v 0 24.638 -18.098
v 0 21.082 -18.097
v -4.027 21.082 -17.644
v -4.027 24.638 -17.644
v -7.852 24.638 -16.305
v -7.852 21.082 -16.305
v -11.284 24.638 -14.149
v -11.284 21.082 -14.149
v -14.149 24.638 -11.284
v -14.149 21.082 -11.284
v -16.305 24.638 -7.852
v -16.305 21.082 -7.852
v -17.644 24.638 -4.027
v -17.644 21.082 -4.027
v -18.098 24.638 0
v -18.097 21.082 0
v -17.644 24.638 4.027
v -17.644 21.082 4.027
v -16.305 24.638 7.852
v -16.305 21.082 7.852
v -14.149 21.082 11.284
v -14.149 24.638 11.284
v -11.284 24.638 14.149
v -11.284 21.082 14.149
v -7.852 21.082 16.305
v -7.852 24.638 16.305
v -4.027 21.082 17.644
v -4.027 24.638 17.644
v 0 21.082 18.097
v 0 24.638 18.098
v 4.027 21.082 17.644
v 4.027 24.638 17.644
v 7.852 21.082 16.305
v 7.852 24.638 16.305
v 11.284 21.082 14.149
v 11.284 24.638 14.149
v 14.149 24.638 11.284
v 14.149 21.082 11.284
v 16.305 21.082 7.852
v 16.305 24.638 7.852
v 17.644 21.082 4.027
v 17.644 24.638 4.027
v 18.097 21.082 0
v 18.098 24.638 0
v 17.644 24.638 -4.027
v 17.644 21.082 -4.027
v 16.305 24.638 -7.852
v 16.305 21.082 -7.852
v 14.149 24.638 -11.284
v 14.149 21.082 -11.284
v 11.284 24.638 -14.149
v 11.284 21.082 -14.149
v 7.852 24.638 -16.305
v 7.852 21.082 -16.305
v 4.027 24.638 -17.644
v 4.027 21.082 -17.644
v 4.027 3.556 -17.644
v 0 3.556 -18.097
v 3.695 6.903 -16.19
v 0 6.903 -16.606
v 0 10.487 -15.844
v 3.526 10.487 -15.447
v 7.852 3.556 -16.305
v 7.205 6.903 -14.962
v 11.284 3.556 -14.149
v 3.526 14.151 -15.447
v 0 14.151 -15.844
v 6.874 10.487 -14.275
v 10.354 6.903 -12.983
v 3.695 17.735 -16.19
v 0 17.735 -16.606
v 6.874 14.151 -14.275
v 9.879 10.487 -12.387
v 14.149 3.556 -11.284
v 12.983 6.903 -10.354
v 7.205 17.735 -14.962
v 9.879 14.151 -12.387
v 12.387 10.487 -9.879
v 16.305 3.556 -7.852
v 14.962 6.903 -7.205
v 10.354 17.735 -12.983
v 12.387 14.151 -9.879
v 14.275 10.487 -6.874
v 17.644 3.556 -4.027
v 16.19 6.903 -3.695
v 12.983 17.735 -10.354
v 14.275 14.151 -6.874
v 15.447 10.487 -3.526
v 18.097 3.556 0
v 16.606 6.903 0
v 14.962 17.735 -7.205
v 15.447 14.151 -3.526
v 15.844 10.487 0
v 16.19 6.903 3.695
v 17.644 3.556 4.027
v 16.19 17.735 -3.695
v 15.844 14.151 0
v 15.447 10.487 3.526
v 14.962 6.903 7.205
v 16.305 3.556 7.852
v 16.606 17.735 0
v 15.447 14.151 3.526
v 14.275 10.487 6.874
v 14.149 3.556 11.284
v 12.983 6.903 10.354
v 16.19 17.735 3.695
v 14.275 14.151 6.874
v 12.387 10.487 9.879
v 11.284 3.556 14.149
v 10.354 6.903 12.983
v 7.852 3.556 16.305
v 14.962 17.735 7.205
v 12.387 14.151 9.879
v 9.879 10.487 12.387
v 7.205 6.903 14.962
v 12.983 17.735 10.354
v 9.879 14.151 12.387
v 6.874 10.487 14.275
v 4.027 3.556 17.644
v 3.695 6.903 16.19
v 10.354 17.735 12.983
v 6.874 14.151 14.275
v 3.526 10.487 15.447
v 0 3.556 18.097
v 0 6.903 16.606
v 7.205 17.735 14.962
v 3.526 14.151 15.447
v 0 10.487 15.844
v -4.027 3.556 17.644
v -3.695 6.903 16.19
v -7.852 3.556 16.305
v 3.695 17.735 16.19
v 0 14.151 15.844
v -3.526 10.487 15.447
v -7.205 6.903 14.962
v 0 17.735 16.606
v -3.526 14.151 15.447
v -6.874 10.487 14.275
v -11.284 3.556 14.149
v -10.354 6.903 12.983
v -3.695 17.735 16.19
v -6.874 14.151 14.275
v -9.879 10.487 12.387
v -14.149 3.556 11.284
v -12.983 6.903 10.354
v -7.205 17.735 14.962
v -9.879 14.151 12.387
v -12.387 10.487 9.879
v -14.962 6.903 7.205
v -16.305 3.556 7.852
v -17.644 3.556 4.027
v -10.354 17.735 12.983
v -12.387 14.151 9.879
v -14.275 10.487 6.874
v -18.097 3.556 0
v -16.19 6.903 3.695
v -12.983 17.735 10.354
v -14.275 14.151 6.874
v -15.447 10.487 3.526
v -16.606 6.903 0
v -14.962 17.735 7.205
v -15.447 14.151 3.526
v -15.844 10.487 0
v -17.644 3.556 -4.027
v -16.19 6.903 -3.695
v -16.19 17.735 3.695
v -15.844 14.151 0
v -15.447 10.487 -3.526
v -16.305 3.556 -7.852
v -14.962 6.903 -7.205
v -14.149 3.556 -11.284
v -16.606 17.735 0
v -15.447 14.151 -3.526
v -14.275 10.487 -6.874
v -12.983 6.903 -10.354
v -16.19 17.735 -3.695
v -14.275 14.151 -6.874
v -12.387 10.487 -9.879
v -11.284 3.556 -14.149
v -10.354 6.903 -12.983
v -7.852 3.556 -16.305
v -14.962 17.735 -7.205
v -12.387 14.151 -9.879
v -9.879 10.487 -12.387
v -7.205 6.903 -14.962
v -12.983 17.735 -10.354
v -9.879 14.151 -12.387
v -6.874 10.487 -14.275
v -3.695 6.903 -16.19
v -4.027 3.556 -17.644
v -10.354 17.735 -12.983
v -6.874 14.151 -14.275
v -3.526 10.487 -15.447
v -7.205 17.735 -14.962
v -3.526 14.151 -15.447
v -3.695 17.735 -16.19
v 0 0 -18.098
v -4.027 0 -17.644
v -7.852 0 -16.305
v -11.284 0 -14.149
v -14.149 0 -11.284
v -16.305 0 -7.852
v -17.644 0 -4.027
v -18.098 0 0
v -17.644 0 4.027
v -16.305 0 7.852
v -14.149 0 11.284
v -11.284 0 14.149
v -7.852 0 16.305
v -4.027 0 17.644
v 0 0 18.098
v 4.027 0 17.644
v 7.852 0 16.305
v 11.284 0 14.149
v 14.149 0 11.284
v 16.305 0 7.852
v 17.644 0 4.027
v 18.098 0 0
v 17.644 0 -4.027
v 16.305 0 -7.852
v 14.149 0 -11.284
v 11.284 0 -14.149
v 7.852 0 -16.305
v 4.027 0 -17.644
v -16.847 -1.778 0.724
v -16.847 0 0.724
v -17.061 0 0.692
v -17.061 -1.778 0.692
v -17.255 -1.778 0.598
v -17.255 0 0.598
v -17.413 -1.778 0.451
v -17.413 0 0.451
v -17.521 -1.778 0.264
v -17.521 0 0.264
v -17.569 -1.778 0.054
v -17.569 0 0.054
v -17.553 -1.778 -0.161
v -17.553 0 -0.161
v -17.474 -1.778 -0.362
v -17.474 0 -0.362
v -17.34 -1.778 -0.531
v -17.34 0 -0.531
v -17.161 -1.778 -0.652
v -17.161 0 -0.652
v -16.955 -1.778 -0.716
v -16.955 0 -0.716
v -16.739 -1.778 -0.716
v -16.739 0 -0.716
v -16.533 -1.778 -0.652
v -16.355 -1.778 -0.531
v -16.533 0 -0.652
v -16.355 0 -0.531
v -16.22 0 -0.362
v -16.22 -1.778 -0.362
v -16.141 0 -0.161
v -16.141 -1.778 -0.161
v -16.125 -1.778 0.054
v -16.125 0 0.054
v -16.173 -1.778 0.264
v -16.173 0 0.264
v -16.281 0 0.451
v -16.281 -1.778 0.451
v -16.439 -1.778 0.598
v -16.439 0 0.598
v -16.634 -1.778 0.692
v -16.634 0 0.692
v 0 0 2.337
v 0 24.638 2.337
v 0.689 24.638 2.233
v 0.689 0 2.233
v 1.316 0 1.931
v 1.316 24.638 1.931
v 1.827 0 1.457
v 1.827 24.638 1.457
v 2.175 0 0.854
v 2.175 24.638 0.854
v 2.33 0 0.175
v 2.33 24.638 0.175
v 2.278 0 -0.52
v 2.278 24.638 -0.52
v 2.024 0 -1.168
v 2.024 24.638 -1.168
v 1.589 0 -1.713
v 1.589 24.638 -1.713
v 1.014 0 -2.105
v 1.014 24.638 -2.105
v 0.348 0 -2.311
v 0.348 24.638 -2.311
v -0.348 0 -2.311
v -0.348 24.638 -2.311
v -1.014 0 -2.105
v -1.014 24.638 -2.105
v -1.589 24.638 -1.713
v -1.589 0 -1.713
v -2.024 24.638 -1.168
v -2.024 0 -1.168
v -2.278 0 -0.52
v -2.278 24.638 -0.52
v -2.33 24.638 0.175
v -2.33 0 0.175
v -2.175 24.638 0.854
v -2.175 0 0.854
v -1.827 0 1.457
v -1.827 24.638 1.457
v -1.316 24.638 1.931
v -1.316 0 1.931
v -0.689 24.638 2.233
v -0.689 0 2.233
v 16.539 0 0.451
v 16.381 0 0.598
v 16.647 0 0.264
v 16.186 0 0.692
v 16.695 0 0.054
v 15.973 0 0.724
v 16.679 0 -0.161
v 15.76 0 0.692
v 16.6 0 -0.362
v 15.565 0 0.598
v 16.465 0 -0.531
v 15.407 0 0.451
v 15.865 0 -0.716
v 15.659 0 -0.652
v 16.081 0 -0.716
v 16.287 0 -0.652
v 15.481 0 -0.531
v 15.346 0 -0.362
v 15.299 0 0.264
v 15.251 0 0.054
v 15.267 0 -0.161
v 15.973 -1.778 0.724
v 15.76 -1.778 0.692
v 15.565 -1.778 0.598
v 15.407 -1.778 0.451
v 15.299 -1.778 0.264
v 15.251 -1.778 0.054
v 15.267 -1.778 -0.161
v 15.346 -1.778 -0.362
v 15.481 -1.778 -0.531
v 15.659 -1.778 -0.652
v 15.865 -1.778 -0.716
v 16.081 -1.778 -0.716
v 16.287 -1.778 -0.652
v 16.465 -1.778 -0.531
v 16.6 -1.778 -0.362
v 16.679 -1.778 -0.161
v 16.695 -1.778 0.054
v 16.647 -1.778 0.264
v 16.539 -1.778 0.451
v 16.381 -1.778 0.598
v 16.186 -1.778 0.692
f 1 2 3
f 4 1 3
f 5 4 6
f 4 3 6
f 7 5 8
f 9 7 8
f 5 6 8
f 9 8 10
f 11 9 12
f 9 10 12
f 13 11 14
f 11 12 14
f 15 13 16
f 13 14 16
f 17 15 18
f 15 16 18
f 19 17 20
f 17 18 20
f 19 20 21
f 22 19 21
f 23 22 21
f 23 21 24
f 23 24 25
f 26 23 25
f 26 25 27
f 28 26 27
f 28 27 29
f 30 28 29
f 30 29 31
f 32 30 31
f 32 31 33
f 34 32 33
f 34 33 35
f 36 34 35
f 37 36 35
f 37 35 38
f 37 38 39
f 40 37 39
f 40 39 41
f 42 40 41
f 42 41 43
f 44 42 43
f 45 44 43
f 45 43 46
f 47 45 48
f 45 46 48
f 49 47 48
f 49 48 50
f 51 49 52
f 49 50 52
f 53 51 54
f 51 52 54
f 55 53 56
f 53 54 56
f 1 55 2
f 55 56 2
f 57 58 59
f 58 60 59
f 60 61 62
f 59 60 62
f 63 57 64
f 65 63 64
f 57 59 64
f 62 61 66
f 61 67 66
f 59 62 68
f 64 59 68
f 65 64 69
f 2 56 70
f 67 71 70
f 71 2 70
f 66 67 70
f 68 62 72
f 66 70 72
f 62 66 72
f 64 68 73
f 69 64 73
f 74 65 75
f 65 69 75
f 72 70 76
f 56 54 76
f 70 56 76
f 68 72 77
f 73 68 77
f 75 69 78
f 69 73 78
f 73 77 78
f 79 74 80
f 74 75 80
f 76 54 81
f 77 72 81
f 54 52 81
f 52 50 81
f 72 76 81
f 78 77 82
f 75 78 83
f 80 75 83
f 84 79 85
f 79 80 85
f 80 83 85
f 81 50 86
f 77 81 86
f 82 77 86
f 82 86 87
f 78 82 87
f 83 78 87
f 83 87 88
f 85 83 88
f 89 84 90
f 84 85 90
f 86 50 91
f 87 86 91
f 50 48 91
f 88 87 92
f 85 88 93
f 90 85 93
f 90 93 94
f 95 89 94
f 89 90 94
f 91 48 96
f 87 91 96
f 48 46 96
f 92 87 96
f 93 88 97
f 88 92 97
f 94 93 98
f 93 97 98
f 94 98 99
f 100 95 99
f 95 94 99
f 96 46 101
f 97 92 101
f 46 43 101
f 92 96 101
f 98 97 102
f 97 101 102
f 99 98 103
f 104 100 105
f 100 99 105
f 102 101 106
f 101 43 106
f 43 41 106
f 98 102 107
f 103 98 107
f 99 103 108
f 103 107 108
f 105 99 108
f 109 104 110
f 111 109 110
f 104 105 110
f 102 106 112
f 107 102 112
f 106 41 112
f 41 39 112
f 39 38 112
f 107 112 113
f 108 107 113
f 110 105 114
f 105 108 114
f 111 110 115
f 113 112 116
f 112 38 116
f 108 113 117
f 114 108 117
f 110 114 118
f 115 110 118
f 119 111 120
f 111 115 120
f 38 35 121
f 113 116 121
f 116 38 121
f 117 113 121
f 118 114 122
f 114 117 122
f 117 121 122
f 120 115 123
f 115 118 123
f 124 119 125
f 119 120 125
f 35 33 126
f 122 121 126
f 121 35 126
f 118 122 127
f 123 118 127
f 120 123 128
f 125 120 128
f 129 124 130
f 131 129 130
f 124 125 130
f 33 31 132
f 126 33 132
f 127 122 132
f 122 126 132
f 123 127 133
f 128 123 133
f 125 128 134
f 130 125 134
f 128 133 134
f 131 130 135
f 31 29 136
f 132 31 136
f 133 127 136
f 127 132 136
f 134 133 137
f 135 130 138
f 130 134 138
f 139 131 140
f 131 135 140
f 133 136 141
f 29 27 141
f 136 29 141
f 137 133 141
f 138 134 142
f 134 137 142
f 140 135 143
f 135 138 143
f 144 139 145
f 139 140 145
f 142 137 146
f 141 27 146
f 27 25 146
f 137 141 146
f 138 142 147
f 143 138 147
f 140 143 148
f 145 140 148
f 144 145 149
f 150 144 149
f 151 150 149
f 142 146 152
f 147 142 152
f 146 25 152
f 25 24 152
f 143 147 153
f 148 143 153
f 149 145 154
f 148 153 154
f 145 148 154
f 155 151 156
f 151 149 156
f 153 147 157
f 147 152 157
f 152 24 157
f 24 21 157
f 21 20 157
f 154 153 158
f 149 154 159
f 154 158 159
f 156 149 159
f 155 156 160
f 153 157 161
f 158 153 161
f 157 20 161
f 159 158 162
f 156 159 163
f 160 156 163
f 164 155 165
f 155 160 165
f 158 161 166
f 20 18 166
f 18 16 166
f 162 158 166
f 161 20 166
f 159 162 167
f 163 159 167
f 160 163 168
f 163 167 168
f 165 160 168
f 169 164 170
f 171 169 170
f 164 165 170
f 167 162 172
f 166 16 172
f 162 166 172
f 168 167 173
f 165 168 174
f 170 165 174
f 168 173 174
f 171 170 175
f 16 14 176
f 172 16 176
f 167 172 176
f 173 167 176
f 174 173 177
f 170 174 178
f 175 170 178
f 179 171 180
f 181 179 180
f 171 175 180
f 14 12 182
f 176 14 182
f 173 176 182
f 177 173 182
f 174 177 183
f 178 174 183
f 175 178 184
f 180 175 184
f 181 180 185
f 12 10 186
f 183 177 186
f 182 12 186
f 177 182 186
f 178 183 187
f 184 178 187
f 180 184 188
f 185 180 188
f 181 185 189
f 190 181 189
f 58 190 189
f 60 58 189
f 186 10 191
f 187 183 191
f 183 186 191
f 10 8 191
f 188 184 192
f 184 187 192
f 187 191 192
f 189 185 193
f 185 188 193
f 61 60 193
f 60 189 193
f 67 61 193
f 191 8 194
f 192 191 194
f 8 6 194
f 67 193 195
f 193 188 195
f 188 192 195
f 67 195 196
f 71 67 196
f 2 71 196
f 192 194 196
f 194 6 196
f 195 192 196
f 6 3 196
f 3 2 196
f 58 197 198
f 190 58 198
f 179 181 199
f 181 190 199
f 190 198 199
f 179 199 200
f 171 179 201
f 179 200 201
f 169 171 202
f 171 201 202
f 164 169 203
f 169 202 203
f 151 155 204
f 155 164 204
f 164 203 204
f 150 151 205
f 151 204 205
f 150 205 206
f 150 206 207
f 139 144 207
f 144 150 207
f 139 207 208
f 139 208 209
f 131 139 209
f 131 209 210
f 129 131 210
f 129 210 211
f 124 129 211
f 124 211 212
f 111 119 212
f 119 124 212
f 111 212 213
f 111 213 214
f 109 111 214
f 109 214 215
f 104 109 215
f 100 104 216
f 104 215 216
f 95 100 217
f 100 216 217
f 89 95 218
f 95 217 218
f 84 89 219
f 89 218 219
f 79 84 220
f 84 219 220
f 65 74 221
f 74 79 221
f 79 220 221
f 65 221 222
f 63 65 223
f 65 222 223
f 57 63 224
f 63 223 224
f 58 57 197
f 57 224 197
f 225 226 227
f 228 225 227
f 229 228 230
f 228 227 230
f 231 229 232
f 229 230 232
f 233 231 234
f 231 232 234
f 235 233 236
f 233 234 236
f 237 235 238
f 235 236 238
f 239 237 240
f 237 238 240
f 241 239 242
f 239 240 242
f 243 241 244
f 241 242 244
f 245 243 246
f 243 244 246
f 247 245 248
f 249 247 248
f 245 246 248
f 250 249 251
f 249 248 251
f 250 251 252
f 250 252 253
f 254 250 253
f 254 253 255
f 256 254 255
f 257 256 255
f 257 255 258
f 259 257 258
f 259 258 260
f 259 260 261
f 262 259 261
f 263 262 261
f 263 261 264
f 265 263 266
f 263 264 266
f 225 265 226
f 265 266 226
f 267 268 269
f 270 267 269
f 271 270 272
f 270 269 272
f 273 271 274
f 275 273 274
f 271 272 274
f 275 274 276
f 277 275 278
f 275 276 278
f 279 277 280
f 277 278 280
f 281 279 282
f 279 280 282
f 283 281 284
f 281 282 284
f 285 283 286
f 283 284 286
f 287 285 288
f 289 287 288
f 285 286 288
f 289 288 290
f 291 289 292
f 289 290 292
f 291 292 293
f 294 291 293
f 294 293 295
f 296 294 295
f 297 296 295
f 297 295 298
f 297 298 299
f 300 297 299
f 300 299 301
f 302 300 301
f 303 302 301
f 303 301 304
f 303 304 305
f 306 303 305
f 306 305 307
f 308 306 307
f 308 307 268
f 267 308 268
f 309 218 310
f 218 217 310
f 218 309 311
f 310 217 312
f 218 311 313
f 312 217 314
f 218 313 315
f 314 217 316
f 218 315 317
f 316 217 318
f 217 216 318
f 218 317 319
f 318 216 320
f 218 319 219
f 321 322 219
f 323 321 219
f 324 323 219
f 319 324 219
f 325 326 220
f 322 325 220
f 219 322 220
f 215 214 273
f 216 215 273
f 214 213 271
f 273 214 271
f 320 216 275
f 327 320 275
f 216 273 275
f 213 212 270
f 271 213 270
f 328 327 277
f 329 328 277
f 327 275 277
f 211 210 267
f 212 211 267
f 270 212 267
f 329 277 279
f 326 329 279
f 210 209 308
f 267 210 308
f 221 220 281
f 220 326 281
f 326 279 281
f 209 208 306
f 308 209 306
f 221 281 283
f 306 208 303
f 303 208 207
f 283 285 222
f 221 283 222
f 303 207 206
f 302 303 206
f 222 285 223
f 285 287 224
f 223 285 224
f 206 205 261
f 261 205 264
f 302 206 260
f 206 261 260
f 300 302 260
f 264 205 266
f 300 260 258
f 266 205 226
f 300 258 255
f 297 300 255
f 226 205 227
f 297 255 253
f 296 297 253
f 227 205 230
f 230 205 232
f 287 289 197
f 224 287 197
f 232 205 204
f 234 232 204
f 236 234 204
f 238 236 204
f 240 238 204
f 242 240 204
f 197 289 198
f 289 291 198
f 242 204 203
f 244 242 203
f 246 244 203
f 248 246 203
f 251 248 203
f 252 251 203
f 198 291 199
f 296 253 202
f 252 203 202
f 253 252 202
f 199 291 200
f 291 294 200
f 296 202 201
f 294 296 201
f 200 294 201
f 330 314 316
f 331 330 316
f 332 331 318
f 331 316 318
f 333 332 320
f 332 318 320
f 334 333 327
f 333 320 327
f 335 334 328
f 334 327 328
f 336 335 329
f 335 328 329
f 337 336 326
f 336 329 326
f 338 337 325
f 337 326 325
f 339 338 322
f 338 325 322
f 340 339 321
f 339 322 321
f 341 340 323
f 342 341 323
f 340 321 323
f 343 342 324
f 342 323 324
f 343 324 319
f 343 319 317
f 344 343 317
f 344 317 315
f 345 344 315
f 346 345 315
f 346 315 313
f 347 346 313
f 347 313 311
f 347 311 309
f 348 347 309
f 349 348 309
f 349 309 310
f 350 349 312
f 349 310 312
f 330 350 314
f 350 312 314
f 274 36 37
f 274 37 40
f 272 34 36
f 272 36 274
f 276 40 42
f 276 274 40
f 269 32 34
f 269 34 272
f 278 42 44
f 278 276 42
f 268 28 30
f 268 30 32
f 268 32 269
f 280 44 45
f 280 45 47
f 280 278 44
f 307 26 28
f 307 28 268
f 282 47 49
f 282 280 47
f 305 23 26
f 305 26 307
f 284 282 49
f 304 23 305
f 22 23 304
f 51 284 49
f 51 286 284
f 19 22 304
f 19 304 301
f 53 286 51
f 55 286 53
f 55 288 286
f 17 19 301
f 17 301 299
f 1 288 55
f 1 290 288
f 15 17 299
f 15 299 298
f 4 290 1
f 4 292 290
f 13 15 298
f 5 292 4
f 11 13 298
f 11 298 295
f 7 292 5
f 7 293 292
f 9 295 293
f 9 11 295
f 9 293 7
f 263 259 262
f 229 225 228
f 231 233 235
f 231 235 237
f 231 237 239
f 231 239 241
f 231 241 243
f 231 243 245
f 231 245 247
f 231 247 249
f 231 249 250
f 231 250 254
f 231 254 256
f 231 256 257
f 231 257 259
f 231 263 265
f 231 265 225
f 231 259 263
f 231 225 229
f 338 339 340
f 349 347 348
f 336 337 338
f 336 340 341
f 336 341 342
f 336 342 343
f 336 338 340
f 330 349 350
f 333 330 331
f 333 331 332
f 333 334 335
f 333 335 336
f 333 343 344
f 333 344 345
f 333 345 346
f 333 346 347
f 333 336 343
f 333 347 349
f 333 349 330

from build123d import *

# Parameters (mm, degrees)
SKETCH2_R           = 18.0975
BOSS_EXTRUDE1_DEPTH = 24.638
SKETCH3_R           = 2.3368
CUT_EXTRUDE1_DEPTH  = 36.52562535
SKETCH4_R           = 0.7239
BOSS_EXTRUDE2_DEPTH = 1.778


with BuildPart() as part:
    # Sketch2 → Boss-Extrude1 (new body)
    with BuildSketch(Plane(origin=(0, 0, 0), x_dir=(1, 0, 0), z_dir=(0, 1, 0))):
        with Locations(Location((0, 0, 0), (0, 0, 90))):
            Circle(SKETCH2_R)
    extrude(amount=BOSS_EXTRUDE1_DEPTH)

    # Sketch3 → Cut-Extrude1 (cut, through all)
    with BuildSketch(Plane(origin=(0, 24.638, 0), x_dir=(1, 0, 0), z_dir=(0, 1, 0))):
        with Locations(Location((0, 0, 0), (0, 0, 270))):
            Circle(SKETCH3_R)
    extrude(amount=-CUT_EXTRUDE1_DEPTH, mode=Mode.SUBTRACT)

    # Sketch4 → Boss-Extrude2 (add)
    with BuildSketch(Plane.XZ):
        with Locations(Location((15.972995617, 0, 0), (0, 0, 90))):
            Circle(SKETCH4_R)
        with Locations(Location((-16.847197726, 0, 0), (0, 0, 90))):
            Circle(SKETCH4_R)
    extrude(amount=BOSS_EXTRUDE2_DEPTH)

    # Sketch7 → Cut-Revolve1 (revolve, cut)
    with BuildSketch(Plane.XY, mode=Mode.PRIVATE) as cut_revolve1_sk:
        with BuildLine():
            Line((-18.0975, 21.082), (-18.0975, 3.556))
            ThreePointArc((-18.0975, 3.556), (-15.748, 12.319), (-18.0975, 21.082))
        make_face()
    revolve(cut_revolve1_sk.sketch.rotate(Axis((0, 24.735696044, 0), (0, -1, 0)), 90), axis=Axis((0, 24.735696044, 0), (0, -1, 0)), mode=Mode.SUBTRACT)


solid = part.part
